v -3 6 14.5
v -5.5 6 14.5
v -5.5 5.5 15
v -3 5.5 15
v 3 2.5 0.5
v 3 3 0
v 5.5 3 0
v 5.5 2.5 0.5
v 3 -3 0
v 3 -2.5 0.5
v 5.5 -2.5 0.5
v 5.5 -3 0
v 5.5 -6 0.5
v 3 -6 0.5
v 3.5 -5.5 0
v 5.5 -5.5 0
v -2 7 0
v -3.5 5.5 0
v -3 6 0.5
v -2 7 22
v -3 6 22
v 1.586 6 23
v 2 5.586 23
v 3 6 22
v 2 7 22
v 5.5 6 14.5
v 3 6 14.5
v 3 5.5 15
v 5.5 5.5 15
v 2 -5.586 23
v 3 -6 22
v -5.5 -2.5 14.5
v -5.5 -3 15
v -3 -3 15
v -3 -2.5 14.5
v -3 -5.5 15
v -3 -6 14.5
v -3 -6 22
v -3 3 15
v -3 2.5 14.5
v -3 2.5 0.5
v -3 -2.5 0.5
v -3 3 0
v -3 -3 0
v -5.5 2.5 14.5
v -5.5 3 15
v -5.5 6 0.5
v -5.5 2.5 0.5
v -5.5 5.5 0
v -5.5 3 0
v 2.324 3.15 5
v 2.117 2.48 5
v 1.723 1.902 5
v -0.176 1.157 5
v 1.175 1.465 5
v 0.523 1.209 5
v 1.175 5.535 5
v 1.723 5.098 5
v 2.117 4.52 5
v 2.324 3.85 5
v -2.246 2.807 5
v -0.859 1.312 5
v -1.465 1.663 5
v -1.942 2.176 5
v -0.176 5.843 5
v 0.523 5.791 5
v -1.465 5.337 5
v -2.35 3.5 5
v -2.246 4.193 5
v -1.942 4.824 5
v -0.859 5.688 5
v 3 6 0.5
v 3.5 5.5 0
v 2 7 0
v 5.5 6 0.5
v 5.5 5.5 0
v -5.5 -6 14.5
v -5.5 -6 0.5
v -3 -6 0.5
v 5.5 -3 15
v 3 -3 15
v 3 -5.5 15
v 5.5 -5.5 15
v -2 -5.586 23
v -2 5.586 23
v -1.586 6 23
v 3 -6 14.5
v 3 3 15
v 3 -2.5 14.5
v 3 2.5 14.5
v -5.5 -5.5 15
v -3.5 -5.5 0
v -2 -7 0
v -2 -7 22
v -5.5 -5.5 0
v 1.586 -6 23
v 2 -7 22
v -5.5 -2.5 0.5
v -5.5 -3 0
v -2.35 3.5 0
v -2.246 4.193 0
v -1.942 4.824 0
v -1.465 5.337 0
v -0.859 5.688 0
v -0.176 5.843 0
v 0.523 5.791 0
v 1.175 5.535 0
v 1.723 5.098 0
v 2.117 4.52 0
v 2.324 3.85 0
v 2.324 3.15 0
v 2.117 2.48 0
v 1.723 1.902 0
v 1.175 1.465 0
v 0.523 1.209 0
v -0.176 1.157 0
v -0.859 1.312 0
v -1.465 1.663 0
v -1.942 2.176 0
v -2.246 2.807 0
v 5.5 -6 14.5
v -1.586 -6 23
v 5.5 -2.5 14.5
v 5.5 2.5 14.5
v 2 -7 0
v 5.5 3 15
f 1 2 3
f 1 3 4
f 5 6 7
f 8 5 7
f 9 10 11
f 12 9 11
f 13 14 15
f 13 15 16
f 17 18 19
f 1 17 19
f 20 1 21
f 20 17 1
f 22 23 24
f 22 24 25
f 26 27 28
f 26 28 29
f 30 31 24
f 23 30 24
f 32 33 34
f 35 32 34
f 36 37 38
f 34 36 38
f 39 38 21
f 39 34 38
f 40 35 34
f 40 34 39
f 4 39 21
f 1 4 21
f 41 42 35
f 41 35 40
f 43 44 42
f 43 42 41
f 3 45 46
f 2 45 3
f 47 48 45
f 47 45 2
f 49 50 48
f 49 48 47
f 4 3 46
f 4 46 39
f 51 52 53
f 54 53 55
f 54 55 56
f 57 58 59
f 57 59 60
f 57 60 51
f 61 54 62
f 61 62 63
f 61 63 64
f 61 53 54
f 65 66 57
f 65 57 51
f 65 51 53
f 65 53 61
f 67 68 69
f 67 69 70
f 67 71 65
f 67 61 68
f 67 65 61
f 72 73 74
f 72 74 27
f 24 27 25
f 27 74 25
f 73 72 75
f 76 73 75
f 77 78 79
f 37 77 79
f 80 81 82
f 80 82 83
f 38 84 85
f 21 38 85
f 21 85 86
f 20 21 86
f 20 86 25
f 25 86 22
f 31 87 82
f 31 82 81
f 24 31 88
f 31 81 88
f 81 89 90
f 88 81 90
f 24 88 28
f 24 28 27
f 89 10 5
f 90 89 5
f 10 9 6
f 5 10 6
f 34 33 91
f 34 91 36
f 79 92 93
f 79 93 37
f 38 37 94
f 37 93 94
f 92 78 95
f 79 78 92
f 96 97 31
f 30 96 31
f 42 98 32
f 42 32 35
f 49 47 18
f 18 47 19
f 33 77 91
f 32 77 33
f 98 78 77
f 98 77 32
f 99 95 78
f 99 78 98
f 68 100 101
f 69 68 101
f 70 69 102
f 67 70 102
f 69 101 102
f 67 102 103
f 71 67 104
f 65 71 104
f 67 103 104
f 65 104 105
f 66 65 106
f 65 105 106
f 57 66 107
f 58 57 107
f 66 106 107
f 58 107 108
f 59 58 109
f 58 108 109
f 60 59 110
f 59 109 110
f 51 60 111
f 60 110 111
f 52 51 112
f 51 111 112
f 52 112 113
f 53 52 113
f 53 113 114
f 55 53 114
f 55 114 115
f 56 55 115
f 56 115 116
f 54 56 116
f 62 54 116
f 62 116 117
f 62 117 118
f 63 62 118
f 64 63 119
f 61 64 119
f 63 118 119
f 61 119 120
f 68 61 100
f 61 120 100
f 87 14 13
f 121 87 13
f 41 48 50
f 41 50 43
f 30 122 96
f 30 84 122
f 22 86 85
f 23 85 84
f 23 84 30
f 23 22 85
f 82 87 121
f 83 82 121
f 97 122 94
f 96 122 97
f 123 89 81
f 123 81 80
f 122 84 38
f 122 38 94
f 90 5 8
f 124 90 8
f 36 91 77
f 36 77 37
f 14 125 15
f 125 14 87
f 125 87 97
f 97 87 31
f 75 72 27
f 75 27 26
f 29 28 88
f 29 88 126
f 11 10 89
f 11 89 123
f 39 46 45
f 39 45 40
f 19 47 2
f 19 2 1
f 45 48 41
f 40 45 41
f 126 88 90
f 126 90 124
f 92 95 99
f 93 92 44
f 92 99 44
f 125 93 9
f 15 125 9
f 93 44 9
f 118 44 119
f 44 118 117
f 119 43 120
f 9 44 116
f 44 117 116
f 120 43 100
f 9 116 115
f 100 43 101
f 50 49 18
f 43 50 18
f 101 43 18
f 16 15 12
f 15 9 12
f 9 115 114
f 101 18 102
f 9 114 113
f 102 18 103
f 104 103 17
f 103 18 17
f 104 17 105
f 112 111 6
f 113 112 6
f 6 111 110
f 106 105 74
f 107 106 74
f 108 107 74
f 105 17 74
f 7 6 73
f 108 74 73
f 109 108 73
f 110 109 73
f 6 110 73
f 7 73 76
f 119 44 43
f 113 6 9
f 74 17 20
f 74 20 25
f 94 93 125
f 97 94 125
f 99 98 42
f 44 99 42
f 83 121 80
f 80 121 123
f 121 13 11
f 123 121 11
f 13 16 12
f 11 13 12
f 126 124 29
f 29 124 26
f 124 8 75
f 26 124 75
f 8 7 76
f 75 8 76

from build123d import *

# Parameters (mm, degrees)
SKETCH_1_W          = 6
SKETCH_1_H          = 14
EXTRUDE_1_DEPTH     = 23
CHAMFER_1_SIZE      = 1
SKETCH_2_W          = 2.5
SKETCH_2_H          = 3.5
EXTRUDE_2_DEPTH     = 15
CHAMFER_2_SIZE      = 0.5
CHAMFER_3_SIZE      = 1
SKETCH_3_R          = 2.35
CUT_EXTRUDE_1_DEPTH = 5


with BuildPart() as part:
    # 스케치1 → 보스-돌출1 (new body)
    with BuildSketch(Plane.XY):
        Rectangle(SKETCH_1_W, SKETCH_1_H)
    extrude(amount=EXTRUDE_1_DEPTH)

    # 모따기1
    chamfer_1_edges = [part.edges().sort_by_distance(p)[0] for p in [
        (3, -7, 11.5),
        (-3, -7, 11.5),
        (-3, 7, 11.5),
        (3, 7, 11.5),
    ]]
    chamfer(chamfer_1_edges, length=CHAMFER_1_SIZE)

    # 스케치2 → 보스-돌출2 (add)
    with BuildSketch(Plane.XY):
        with Locations((4.25, 4.25)):
            Rectangle(SKETCH_2_W, SKETCH_2_H)
        with Locations((4.25, -4.25)):
            Rectangle(SKETCH_2_W, SKETCH_2_H)
        with Locations((-4.25, -4.25)):
            Rectangle(SKETCH_2_W, SKETCH_2_H)
        with Locations((-4.25, 4.25)):
            Rectangle(SKETCH_2_W, SKETCH_2_H)
    extrude(amount=EXTRUDE_2_DEPTH)

    # 모따기2
    chamfer_2_edges = [part.edges().sort_by_distance(p)[0] for p in [
        (-4.25, -6, 15),
        (-4.25, -2.5, 15),
        (-4.25, 2.5, 15),
        (-4.25, 6, 15),
        (-4.25, 2.5, 0),
        (-4.25, 6, 0),
        (-4.25, -6, 0),
        (-4.25, -2.5, 0),
        (4.25, -2.5, 0),
        (4.25, -2.5, 15),
        (4.25, -6, 0),
        (4.25, -6, 15),
        (4.25, 2.5, 0),
        (4.25, 2.5, 15),
        (4.25, 6, 0),
        (4.25, 6, 15),
    ]]
    chamfer(chamfer_2_edges, length=CHAMFER_2_SIZE)

    # 모따기3
    chamfer_3_edges = [part.edges().sort_by_distance(p)[0] for p in [
        (0, -7, 23),
        (-3, 0, 23),
        (3, 0, 23),
        (0, 7, 23),
        (-2.5, 6.5, 23),
        (2.5, 6.5, 23),
        (2.5, -6.5, 23),
        (-2.5, -6.5, 23),
    ]]
    chamfer(chamfer_3_edges, length=CHAMFER_3_SIZE)

    # 스케치3 → 컷-돌출1 (cut)
    with BuildSketch(Plane(origin=(0, 0, 0), x_dir=(-1, 0, 0), z_dir=(0, 0, -1))):
        with Locations((0, 3.5)):
            Circle(SKETCH_3_R)
    extrude(amount=-CUT_EXTRUDE_1_DEPTH, mode=Mode.SUBTRACT)


solid = part.part
